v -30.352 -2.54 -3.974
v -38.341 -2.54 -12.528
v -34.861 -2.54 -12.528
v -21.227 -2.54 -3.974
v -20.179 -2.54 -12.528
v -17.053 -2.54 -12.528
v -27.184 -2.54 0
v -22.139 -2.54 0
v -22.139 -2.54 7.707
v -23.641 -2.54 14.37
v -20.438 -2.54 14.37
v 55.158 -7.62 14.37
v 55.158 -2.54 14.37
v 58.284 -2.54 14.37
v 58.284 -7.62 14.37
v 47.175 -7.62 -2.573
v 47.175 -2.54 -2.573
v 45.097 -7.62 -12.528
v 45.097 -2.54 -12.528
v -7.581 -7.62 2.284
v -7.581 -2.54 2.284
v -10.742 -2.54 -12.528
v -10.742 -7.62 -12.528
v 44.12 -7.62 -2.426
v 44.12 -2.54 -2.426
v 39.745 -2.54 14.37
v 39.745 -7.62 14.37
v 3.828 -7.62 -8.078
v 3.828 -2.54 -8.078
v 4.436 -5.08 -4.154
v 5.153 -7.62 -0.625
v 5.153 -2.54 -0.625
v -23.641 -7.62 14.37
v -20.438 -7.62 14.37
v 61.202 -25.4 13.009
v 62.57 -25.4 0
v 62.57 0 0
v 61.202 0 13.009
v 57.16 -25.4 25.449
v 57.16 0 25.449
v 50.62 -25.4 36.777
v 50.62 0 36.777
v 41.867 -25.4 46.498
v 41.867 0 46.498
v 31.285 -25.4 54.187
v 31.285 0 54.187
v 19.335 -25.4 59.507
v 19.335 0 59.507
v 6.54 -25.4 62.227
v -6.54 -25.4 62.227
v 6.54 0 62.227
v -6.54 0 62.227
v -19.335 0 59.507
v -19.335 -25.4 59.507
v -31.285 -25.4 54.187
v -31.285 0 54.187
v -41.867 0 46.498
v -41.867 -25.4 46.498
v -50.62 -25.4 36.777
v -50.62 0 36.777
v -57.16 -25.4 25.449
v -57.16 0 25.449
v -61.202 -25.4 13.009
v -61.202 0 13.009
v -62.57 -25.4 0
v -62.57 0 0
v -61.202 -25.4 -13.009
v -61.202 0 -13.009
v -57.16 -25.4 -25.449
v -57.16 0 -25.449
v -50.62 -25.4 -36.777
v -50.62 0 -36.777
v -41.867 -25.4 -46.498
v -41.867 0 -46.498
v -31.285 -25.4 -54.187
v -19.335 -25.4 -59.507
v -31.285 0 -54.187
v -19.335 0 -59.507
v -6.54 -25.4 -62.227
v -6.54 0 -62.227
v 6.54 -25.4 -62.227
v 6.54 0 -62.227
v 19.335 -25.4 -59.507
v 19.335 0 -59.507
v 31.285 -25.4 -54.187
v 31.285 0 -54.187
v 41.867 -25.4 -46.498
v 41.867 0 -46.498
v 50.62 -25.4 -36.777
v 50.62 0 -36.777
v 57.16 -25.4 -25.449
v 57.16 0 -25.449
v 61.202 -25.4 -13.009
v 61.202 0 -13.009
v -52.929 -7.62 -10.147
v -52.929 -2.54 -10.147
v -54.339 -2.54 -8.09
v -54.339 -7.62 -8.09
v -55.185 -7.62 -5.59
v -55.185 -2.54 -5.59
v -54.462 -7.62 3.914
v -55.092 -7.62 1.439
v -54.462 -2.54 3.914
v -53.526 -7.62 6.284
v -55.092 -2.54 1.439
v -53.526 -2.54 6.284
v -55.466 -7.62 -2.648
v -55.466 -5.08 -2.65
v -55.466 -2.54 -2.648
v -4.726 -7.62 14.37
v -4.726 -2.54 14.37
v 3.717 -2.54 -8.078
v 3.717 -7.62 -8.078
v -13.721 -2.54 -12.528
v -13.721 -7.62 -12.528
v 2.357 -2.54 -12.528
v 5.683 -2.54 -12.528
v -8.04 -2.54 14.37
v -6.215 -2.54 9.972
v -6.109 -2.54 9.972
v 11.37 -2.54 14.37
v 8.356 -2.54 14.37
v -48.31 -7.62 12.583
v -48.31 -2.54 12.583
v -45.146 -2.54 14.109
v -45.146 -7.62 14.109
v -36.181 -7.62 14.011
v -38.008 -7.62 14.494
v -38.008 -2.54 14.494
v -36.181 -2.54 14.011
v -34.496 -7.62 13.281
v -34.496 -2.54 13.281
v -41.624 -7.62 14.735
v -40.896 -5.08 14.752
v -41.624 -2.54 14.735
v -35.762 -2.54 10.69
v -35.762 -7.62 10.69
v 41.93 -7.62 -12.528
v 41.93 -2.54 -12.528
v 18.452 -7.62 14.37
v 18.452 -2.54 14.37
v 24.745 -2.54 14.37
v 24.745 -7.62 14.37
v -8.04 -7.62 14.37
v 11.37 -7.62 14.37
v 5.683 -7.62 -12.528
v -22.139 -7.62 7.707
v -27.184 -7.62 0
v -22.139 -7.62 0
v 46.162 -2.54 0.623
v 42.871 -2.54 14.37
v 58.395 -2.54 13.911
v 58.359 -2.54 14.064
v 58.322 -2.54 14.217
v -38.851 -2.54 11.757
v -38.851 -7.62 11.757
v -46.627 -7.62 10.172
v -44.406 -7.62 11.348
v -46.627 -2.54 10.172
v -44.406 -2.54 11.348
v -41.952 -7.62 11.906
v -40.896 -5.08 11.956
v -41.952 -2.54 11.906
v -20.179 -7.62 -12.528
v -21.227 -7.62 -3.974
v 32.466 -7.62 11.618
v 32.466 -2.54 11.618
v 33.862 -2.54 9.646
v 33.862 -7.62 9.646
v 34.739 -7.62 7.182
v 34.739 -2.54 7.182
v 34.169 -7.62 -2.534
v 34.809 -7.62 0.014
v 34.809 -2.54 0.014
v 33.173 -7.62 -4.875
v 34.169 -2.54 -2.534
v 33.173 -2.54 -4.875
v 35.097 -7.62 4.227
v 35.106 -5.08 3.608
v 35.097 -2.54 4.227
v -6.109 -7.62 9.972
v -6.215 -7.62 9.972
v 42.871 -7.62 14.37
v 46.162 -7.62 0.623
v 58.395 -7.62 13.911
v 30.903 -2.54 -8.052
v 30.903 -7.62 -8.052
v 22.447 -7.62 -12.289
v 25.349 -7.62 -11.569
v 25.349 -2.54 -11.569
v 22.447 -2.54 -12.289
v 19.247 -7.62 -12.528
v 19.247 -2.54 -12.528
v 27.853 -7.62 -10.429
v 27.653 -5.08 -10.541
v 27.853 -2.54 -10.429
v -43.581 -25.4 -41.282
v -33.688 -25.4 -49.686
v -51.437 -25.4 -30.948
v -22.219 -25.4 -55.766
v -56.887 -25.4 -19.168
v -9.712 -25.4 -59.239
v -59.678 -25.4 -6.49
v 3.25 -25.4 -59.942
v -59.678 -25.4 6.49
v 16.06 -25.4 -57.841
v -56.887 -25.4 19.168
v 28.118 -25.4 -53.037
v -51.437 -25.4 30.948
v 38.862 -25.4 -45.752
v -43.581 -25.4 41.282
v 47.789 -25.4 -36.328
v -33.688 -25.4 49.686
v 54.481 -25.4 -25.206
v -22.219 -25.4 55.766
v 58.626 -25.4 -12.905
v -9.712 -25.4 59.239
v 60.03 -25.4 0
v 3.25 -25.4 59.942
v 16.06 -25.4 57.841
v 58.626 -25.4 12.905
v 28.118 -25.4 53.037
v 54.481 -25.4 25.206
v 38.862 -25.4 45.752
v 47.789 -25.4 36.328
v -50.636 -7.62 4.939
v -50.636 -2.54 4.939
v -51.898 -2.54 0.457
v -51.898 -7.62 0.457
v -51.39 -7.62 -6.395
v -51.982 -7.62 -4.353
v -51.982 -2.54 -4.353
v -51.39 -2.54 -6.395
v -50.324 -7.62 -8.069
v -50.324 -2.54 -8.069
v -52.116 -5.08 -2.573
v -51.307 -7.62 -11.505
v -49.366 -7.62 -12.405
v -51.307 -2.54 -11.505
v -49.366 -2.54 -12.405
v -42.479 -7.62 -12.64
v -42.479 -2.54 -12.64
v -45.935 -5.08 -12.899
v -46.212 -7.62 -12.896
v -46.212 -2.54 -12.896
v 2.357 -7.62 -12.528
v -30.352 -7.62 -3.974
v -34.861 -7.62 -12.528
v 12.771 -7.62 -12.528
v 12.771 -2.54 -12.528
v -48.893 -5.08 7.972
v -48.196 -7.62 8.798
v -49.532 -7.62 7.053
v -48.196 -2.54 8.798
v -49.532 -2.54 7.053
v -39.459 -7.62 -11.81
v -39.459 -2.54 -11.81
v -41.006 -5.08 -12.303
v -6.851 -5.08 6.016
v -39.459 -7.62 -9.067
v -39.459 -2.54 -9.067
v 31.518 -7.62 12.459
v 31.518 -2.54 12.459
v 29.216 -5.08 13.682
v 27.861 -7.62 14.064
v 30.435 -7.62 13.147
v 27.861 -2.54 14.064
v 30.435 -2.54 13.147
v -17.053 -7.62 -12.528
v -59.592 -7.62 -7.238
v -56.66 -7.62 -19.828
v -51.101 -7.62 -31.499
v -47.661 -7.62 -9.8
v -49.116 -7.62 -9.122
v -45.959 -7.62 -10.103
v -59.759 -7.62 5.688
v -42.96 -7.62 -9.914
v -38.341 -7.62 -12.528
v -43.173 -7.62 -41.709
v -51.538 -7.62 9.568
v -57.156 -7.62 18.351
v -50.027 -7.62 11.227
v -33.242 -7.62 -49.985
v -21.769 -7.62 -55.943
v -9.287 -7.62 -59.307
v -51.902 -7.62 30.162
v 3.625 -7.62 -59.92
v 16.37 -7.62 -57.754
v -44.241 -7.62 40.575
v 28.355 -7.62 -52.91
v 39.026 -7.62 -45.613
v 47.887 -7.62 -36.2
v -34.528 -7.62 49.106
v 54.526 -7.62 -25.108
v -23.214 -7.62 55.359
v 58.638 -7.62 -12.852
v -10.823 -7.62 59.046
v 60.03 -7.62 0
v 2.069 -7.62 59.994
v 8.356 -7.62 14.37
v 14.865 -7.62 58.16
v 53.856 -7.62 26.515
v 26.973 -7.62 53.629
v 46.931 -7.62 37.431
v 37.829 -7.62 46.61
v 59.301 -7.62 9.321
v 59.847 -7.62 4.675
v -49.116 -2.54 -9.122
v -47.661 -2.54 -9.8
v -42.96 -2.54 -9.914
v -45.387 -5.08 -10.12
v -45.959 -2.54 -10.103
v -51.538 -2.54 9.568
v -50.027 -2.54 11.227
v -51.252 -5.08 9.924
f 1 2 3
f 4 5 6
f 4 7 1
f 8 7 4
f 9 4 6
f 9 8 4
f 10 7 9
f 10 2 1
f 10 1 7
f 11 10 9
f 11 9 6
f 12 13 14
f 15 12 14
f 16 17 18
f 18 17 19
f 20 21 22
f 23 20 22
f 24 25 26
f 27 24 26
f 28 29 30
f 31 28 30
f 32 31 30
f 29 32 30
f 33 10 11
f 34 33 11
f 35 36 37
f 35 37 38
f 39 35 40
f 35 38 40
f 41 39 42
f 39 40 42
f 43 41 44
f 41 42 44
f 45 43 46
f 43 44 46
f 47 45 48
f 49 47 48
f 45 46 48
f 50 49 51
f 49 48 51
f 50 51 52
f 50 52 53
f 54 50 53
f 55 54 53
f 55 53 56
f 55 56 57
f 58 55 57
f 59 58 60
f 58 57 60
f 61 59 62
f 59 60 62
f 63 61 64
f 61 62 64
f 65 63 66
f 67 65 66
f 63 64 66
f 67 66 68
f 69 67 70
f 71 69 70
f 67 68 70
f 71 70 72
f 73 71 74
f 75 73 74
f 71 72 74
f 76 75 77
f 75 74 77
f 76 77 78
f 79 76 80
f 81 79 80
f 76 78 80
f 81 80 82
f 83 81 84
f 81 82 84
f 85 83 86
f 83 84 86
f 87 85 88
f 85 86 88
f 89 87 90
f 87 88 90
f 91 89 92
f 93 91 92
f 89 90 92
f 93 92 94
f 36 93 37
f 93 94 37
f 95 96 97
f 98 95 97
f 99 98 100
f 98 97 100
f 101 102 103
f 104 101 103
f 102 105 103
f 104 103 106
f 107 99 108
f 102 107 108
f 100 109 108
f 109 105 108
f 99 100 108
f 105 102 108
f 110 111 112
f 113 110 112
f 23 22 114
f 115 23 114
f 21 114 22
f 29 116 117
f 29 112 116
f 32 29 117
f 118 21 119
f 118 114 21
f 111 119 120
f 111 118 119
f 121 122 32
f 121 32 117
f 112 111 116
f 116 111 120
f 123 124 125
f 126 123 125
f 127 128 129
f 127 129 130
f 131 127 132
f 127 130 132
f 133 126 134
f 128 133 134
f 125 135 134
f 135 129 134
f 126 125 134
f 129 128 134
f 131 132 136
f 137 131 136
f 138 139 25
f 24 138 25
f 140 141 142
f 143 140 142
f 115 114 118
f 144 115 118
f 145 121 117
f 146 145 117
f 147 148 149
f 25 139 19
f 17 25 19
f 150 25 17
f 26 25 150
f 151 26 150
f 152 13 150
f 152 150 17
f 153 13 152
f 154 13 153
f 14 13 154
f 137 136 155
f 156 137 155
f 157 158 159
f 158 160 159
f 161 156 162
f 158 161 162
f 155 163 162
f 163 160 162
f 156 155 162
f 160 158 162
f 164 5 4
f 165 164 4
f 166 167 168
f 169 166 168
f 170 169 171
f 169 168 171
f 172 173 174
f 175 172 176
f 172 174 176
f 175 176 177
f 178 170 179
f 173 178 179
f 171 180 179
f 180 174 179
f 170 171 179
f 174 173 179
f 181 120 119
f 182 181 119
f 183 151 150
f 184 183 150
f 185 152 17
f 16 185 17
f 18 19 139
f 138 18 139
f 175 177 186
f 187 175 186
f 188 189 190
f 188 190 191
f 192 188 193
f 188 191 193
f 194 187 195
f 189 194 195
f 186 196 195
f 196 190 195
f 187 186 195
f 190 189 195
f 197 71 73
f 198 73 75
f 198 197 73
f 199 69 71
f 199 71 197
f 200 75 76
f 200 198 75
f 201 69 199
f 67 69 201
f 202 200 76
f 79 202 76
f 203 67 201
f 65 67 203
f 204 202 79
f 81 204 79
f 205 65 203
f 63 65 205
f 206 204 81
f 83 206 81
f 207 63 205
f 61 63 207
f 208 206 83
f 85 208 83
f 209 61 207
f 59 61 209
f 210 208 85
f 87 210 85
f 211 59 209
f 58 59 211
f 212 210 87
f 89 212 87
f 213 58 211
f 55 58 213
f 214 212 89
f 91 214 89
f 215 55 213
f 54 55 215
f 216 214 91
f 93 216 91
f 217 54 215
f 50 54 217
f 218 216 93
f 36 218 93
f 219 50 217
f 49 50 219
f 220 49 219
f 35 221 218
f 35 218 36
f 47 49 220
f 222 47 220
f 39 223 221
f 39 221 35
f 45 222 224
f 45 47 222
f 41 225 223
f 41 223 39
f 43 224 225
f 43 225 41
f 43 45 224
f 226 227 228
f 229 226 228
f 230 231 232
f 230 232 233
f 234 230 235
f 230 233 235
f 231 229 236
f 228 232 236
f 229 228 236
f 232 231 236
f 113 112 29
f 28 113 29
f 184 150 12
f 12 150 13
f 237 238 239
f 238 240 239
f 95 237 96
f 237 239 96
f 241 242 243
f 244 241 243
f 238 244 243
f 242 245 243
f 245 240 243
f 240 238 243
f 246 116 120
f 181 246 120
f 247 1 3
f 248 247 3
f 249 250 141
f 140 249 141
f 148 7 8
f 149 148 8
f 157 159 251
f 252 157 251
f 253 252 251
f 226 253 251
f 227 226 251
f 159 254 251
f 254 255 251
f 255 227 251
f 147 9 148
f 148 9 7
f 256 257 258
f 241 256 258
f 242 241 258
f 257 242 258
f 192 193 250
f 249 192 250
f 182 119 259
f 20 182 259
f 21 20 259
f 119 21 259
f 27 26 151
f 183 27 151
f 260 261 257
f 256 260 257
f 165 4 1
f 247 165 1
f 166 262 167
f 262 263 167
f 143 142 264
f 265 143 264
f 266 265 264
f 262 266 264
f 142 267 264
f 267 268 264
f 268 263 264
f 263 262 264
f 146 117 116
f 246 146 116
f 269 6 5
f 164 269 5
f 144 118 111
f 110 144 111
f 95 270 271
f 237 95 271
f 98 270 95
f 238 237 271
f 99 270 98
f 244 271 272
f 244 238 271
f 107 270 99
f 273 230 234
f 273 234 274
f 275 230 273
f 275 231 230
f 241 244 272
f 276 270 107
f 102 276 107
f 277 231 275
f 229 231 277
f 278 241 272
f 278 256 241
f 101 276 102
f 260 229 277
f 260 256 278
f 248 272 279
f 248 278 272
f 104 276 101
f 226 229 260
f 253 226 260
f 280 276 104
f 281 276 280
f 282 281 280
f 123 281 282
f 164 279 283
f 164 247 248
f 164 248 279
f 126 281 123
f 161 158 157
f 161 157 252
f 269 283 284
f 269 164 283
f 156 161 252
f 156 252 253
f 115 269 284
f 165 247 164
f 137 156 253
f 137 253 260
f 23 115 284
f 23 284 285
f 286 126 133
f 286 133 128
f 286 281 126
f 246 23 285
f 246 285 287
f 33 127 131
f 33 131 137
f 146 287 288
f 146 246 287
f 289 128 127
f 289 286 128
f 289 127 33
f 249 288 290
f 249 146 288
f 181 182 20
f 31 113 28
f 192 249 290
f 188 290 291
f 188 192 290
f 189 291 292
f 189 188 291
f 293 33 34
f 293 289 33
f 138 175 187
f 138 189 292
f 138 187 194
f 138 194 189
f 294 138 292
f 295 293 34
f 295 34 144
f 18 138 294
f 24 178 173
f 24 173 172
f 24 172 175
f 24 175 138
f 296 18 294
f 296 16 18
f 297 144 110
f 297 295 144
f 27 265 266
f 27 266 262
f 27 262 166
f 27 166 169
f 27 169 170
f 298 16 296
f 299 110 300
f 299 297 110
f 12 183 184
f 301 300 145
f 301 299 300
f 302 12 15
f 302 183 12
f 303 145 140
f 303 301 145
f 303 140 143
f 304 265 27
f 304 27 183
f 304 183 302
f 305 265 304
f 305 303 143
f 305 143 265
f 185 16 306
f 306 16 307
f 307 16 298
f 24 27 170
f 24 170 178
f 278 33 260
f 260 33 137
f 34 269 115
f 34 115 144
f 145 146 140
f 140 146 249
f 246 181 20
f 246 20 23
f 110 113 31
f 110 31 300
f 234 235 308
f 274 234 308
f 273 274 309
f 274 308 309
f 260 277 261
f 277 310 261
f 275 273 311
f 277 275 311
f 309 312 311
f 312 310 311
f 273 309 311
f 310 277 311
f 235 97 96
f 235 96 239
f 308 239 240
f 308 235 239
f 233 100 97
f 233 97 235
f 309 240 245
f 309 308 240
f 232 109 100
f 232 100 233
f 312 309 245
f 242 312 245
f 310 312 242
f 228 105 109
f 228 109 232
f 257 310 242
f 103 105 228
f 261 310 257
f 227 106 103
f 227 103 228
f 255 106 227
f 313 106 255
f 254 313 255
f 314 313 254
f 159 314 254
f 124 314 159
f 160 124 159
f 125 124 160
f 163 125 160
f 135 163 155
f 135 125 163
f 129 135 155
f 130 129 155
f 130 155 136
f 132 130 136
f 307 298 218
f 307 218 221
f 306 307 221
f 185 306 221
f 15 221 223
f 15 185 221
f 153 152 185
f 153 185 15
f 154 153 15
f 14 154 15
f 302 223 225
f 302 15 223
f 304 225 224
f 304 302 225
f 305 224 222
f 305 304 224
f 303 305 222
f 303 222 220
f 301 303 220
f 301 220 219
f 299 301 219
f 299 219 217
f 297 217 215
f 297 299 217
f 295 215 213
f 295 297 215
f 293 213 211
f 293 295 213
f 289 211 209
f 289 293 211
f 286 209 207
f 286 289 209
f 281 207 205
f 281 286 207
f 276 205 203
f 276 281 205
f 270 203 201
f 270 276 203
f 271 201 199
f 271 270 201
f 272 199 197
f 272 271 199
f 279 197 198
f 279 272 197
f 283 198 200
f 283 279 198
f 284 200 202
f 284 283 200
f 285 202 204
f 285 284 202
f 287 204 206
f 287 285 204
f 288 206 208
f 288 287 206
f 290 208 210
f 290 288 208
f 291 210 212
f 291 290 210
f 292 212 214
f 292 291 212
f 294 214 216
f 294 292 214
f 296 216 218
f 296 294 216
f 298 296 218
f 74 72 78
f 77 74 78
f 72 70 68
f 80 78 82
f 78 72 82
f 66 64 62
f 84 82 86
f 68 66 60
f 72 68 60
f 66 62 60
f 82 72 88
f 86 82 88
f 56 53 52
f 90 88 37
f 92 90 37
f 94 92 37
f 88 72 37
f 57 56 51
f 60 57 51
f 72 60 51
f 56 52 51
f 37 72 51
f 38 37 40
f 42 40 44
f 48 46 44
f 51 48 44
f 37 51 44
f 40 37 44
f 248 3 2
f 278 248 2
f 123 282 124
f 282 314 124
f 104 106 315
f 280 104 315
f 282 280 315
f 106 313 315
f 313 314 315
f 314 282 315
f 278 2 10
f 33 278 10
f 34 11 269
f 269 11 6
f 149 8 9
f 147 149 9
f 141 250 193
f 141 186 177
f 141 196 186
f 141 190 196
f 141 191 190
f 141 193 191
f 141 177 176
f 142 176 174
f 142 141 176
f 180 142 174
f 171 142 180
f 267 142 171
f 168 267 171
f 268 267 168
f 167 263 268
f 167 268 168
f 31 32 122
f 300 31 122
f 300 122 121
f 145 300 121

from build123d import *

# Parameters (mm, degrees)
F0_R     = 62.5695627455
F1_DEPTH = 25.4
F2_T     = -2.54
F4_DEPTH = 5.08
F6_DEPTH = 5.08


with BuildPart() as f1:
    # F0 (on Front) → F1 (new body)
    with BuildSketch(Plane.XZ):
        Circle(F0_R)
    extrude(amount=F1_DEPTH)

    # F2
    f2_openings = [f1.faces().sort_by_distance(p)[0] for p in [
        (0, -25.4, 0),
    ]]
    offset(amount=F2_T, openings=f2_openings)

    # F3 (on face) → F4 (join)
    with BuildSketch(Plane.XZ.offset(2.54)):
        with BuildLine():
            Line((42.8714592834, 14.3697795653), (46.1623315652, 0.6234704811))
            Line((46.1623315652, 0.6234704811), (55.1577749403, 14.3697795653))
            Line((55.1577749403, 14.3697795653), (58.2842846629, 14.3697795653))
            ThreePointArc((58.2842846629, 14.3697795653), (-59.591645919, -7.2376888635), (60.0295627455, 0))
            ThreePointArc((60.0295627455, 0), (59.6196375987, 7.0033717604), (58.3954606874, 13.9110953747))
            Line((58.3954606874, 13.9110953747), (47.174907652, -2.5732086764))
            Line((47.174907652, -2.5732086764), (45.0967718461, -12.5282445057))
            Line((45.0967718461, -12.5282445057), (41.92952804, -12.5282445057))
            Line((41.92952804, -12.5282445057), (44.119518181, -2.4260319196))
            Line((44.119518181, -2.4260319196), (39.7454249692, 14.3697795653))
            Line((39.7454249692, 14.3697795653), (42.8714592834, 14.3697795653))
        make_face()
        with BuildLine():
            add(Edge.make_bspline(
                [(-35.7621383344, 10.6903606455), (-38.3053526918, 11.9560807539), (-40.8956636113, 11.9560807539)],
                knots=[0, 0, 0, 1, 1, 1], degree=2))
            add(Edge.make_bspline(
                [(-40.8956636113, 11.9560807539), (-44.098229839, 11.9560807539), (-46.6267265207, 10.1722984616)],
                knots=[0, 0, 0, 1, 1, 1], degree=2))
            add(Edge.make_bspline(
                [(-46.6267265207, 10.1722984616), (-49.1552232023, 8.3885161693), (-50.6358213756, 4.9386929902)],
                knots=[0, 0, 0, 1, 1, 1], degree=2))
            add(Edge.make_bspline(
                [(-50.6358213756, 4.9386929902), (-52.116419549, 1.488869811), (-52.116419549, -2.5732086764)],
                knots=[0, 0, 0, 1, 1, 1], degree=2))
            add(Edge.make_bspline(
                [(-52.116419549, -2.5732086764), (-52.116419549, -6.0171447853), (-50.3238066513, -8.0687887749)],
                knots=[0, 0, 0, 1, 1, 1], degree=2))
            add(Edge.make_bspline(
                [(-50.3238066513, -8.0687887749), (-48.5311937535, -10.1204327646), (-45.3874982285, -10.1204327646)],
                knots=[0, 0, 0, 1, 1, 1], degree=2))
            add(Edge.make_bspline(
                [(-45.3874982285, -10.1204327646), (-42.8266226604, -10.1204327646), (-39.459218465, -9.066647186)],
                knots=[0, 0, 0, 1, 1, 1], degree=2))
            Line((-39.459218465, -9.066647186), (-39.459218465, -11.8100219325))
            add(Edge.make_bspline(
                [(-39.459218465, -11.8100219325), (-41.0428403681, -12.3810677489), (-42.4792855143, -12.6400988408)],
                knots=[0, 0, 0, 1, 1, 1], degree=2))
            add(Edge.make_bspline(
                [(-42.4792855143, -12.6400988408), (-43.9157306606, -12.8991299328), (-45.9349957638, -12.8991299328)],
                knots=[0, 0, 0, 1, 1, 1], degree=2))
            add(Edge.make_bspline(
                [(-45.9349957638, -12.8991299328), (-50.3915079594, -12.8991299328), (-52.9288352464, -10.1469245808)],
                knots=[0, 0, 0, 1, 1, 1], degree=2))
            add(Edge.make_bspline(
                [(-52.9288352464, -10.1469245808), (-55.4661625335, -7.3947192288), (-55.4661625335, -2.6497405899)],
                knots=[0, 0, 0, 1, 1, 1], degree=2))
            add(Edge.make_bspline(
                [(-55.4661625335, -2.6497405899), (-55.4661625335, 2.1541087517), (-53.526372879, 6.2838885472)],
                knots=[0, 0, 0, 1, 1, 1], degree=2))
            add(Edge.make_bspline(
                [(-53.526372879, 6.2838885472), (-51.5865832245, 10.4136683428), (-48.3104286184, 12.5830537379)],
                knots=[0, 0, 0, 1, 1, 1], degree=2))
            add(Edge.make_bspline(
                [(-48.3104286184, 12.5830537379), (-45.0342740122, 14.7524391329), (-40.8956636113, 14.7524391329)],
                knots=[0, 0, 0, 1, 1, 1], degree=2))
            add(Edge.make_bspline(
                [(-40.8956636113, 14.7524391329), (-37.2751153942, 14.7524391329), (-34.496418226, 13.280671565)],
                knots=[0, 0, 0, 1, 1, 1], degree=2))
            Line((-34.496418226, 13.280671565), (-35.7621383344, 10.6903606455))
        make_face(mode=Mode.SUBTRACT)
        Polygon((-20.1790633255, -12.5282445057), (-21.2269618338, -3.974331401), (-30.3519207548, -3.974331401), (-34.8614165829, -12.5282445057), (-38.3406751134, -12.5282445057), (-23.6406606452, 14.3697795653), (-20.4380944174, 14.3697795653), (-17.0530290113, -12.5282445057), align=None, mode=Mode.SUBTRACT)
        with BuildLine():
            Line((11.3697462601, 14.3697795653), (5.6828363777, -12.5282445057))
            Line((5.6828363777, -12.5282445057), (2.3566416742, -12.5282445057))
            Line((2.3566416742, -12.5282445057), (-6.1089653764, 9.9721380724))
            Line((-6.1089653764, 9.9721380724), (-6.2149326412, 9.9721380724))
            add(Edge.make_bspline(
                [(-6.2149326412, 9.9721380724), (-6.8036396684, 5.9041725147), (-7.5807329443, 2.2836242977)],
                knots=[0, 0, 0, 1, 1, 1], degree=2))
            Line((-7.5807329443, 2.2836242977), (-10.7420896801, -12.5282445057))
            Line((-10.7420896801, -12.5282445057), (-13.7209472375, -12.5282445057))
            Line((-13.7209472375, -12.5282445057), (-8.0399244254, 14.3697795653))
            Line((-8.0399244254, 14.3697795653), (-4.7255038625, 14.3697795653))
            Line((-4.7255038625, 14.3697795653), (3.716554907, -8.0776193803))
            Line((3.716554907, -8.0776193803), (3.8284092421, -8.0776193803))
            add(Edge.make_bspline(
                [(3.8284092421, -8.0776193803), (4.3817938477, -3.9566701902), (5.1530000532, -0.6245884165)],
                knots=[0, 0, 0, 1, 1, 1], degree=2))
            Line((5.1530000532, -0.6245884165), (8.355566281, 14.3697795653))
            Line((8.355566281, 14.3697795653), (11.3697462601, 14.3697795653))
        make_face(mode=Mode.SUBTRACT)
        with BuildLine():
            add(Edge.make_bspline(
                [(32.4660625784, 11.6175742133), (35.1064135952, 8.8653688613), (35.1064135952, 3.6082151088)],
                knots=[0, 0, 0, 1, 1, 1], degree=2))
            add(Edge.make_bspline(
                [(35.1064135952, 3.6082151088), (35.1064135952, -1.1956342328), (33.1725110109, -4.8750531526)],
                knots=[0, 0, 0, 1, 1, 1], degree=2))
            add(Edge.make_bspline(
                [(33.1725110109, -4.8750531526), (31.2386084267, -8.5544720723), (27.6533826313, -10.541358289)],
                knots=[0, 0, 0, 1, 1, 1], degree=2))
            add(Edge.make_bspline(
                [(27.6533826313, -10.541358289), (24.0681568359, -12.5282445057), (19.2466462835, -12.5282445057)],
                knots=[0, 0, 0, 1, 1, 1], degree=2))
            Line((19.2466462835, -12.5282445057), (12.7708689847, -12.5282445057))
            Line((12.7708689847, -12.5282445057), (18.4518917968, 14.3697795653))
            Line((18.4518917968, 14.3697795653), (24.7451699171, 14.3697795653))
            add(Edge.make_bspline(
                [(24.7451699171, 14.3697795653), (29.8257115615, 14.3697795653), (32.4660625784, 11.6175742133)],
                knots=[0, 0, 0, 1, 1, 1], degree=2))
        make_face(mode=Mode.SUBTRACT)
    extrude(amount=F4_DEPTH)

    # F5 (on face) → F6 (join)
    with BuildSketch(Plane.XZ.offset(2.54)):
        Polygon((-22.1393704414, 7.7067422681), (-27.1837823093, 0), (-22.1393704414, 0), align=None)
    extrude(amount=F6_DEPTH)


solid = f1.part
